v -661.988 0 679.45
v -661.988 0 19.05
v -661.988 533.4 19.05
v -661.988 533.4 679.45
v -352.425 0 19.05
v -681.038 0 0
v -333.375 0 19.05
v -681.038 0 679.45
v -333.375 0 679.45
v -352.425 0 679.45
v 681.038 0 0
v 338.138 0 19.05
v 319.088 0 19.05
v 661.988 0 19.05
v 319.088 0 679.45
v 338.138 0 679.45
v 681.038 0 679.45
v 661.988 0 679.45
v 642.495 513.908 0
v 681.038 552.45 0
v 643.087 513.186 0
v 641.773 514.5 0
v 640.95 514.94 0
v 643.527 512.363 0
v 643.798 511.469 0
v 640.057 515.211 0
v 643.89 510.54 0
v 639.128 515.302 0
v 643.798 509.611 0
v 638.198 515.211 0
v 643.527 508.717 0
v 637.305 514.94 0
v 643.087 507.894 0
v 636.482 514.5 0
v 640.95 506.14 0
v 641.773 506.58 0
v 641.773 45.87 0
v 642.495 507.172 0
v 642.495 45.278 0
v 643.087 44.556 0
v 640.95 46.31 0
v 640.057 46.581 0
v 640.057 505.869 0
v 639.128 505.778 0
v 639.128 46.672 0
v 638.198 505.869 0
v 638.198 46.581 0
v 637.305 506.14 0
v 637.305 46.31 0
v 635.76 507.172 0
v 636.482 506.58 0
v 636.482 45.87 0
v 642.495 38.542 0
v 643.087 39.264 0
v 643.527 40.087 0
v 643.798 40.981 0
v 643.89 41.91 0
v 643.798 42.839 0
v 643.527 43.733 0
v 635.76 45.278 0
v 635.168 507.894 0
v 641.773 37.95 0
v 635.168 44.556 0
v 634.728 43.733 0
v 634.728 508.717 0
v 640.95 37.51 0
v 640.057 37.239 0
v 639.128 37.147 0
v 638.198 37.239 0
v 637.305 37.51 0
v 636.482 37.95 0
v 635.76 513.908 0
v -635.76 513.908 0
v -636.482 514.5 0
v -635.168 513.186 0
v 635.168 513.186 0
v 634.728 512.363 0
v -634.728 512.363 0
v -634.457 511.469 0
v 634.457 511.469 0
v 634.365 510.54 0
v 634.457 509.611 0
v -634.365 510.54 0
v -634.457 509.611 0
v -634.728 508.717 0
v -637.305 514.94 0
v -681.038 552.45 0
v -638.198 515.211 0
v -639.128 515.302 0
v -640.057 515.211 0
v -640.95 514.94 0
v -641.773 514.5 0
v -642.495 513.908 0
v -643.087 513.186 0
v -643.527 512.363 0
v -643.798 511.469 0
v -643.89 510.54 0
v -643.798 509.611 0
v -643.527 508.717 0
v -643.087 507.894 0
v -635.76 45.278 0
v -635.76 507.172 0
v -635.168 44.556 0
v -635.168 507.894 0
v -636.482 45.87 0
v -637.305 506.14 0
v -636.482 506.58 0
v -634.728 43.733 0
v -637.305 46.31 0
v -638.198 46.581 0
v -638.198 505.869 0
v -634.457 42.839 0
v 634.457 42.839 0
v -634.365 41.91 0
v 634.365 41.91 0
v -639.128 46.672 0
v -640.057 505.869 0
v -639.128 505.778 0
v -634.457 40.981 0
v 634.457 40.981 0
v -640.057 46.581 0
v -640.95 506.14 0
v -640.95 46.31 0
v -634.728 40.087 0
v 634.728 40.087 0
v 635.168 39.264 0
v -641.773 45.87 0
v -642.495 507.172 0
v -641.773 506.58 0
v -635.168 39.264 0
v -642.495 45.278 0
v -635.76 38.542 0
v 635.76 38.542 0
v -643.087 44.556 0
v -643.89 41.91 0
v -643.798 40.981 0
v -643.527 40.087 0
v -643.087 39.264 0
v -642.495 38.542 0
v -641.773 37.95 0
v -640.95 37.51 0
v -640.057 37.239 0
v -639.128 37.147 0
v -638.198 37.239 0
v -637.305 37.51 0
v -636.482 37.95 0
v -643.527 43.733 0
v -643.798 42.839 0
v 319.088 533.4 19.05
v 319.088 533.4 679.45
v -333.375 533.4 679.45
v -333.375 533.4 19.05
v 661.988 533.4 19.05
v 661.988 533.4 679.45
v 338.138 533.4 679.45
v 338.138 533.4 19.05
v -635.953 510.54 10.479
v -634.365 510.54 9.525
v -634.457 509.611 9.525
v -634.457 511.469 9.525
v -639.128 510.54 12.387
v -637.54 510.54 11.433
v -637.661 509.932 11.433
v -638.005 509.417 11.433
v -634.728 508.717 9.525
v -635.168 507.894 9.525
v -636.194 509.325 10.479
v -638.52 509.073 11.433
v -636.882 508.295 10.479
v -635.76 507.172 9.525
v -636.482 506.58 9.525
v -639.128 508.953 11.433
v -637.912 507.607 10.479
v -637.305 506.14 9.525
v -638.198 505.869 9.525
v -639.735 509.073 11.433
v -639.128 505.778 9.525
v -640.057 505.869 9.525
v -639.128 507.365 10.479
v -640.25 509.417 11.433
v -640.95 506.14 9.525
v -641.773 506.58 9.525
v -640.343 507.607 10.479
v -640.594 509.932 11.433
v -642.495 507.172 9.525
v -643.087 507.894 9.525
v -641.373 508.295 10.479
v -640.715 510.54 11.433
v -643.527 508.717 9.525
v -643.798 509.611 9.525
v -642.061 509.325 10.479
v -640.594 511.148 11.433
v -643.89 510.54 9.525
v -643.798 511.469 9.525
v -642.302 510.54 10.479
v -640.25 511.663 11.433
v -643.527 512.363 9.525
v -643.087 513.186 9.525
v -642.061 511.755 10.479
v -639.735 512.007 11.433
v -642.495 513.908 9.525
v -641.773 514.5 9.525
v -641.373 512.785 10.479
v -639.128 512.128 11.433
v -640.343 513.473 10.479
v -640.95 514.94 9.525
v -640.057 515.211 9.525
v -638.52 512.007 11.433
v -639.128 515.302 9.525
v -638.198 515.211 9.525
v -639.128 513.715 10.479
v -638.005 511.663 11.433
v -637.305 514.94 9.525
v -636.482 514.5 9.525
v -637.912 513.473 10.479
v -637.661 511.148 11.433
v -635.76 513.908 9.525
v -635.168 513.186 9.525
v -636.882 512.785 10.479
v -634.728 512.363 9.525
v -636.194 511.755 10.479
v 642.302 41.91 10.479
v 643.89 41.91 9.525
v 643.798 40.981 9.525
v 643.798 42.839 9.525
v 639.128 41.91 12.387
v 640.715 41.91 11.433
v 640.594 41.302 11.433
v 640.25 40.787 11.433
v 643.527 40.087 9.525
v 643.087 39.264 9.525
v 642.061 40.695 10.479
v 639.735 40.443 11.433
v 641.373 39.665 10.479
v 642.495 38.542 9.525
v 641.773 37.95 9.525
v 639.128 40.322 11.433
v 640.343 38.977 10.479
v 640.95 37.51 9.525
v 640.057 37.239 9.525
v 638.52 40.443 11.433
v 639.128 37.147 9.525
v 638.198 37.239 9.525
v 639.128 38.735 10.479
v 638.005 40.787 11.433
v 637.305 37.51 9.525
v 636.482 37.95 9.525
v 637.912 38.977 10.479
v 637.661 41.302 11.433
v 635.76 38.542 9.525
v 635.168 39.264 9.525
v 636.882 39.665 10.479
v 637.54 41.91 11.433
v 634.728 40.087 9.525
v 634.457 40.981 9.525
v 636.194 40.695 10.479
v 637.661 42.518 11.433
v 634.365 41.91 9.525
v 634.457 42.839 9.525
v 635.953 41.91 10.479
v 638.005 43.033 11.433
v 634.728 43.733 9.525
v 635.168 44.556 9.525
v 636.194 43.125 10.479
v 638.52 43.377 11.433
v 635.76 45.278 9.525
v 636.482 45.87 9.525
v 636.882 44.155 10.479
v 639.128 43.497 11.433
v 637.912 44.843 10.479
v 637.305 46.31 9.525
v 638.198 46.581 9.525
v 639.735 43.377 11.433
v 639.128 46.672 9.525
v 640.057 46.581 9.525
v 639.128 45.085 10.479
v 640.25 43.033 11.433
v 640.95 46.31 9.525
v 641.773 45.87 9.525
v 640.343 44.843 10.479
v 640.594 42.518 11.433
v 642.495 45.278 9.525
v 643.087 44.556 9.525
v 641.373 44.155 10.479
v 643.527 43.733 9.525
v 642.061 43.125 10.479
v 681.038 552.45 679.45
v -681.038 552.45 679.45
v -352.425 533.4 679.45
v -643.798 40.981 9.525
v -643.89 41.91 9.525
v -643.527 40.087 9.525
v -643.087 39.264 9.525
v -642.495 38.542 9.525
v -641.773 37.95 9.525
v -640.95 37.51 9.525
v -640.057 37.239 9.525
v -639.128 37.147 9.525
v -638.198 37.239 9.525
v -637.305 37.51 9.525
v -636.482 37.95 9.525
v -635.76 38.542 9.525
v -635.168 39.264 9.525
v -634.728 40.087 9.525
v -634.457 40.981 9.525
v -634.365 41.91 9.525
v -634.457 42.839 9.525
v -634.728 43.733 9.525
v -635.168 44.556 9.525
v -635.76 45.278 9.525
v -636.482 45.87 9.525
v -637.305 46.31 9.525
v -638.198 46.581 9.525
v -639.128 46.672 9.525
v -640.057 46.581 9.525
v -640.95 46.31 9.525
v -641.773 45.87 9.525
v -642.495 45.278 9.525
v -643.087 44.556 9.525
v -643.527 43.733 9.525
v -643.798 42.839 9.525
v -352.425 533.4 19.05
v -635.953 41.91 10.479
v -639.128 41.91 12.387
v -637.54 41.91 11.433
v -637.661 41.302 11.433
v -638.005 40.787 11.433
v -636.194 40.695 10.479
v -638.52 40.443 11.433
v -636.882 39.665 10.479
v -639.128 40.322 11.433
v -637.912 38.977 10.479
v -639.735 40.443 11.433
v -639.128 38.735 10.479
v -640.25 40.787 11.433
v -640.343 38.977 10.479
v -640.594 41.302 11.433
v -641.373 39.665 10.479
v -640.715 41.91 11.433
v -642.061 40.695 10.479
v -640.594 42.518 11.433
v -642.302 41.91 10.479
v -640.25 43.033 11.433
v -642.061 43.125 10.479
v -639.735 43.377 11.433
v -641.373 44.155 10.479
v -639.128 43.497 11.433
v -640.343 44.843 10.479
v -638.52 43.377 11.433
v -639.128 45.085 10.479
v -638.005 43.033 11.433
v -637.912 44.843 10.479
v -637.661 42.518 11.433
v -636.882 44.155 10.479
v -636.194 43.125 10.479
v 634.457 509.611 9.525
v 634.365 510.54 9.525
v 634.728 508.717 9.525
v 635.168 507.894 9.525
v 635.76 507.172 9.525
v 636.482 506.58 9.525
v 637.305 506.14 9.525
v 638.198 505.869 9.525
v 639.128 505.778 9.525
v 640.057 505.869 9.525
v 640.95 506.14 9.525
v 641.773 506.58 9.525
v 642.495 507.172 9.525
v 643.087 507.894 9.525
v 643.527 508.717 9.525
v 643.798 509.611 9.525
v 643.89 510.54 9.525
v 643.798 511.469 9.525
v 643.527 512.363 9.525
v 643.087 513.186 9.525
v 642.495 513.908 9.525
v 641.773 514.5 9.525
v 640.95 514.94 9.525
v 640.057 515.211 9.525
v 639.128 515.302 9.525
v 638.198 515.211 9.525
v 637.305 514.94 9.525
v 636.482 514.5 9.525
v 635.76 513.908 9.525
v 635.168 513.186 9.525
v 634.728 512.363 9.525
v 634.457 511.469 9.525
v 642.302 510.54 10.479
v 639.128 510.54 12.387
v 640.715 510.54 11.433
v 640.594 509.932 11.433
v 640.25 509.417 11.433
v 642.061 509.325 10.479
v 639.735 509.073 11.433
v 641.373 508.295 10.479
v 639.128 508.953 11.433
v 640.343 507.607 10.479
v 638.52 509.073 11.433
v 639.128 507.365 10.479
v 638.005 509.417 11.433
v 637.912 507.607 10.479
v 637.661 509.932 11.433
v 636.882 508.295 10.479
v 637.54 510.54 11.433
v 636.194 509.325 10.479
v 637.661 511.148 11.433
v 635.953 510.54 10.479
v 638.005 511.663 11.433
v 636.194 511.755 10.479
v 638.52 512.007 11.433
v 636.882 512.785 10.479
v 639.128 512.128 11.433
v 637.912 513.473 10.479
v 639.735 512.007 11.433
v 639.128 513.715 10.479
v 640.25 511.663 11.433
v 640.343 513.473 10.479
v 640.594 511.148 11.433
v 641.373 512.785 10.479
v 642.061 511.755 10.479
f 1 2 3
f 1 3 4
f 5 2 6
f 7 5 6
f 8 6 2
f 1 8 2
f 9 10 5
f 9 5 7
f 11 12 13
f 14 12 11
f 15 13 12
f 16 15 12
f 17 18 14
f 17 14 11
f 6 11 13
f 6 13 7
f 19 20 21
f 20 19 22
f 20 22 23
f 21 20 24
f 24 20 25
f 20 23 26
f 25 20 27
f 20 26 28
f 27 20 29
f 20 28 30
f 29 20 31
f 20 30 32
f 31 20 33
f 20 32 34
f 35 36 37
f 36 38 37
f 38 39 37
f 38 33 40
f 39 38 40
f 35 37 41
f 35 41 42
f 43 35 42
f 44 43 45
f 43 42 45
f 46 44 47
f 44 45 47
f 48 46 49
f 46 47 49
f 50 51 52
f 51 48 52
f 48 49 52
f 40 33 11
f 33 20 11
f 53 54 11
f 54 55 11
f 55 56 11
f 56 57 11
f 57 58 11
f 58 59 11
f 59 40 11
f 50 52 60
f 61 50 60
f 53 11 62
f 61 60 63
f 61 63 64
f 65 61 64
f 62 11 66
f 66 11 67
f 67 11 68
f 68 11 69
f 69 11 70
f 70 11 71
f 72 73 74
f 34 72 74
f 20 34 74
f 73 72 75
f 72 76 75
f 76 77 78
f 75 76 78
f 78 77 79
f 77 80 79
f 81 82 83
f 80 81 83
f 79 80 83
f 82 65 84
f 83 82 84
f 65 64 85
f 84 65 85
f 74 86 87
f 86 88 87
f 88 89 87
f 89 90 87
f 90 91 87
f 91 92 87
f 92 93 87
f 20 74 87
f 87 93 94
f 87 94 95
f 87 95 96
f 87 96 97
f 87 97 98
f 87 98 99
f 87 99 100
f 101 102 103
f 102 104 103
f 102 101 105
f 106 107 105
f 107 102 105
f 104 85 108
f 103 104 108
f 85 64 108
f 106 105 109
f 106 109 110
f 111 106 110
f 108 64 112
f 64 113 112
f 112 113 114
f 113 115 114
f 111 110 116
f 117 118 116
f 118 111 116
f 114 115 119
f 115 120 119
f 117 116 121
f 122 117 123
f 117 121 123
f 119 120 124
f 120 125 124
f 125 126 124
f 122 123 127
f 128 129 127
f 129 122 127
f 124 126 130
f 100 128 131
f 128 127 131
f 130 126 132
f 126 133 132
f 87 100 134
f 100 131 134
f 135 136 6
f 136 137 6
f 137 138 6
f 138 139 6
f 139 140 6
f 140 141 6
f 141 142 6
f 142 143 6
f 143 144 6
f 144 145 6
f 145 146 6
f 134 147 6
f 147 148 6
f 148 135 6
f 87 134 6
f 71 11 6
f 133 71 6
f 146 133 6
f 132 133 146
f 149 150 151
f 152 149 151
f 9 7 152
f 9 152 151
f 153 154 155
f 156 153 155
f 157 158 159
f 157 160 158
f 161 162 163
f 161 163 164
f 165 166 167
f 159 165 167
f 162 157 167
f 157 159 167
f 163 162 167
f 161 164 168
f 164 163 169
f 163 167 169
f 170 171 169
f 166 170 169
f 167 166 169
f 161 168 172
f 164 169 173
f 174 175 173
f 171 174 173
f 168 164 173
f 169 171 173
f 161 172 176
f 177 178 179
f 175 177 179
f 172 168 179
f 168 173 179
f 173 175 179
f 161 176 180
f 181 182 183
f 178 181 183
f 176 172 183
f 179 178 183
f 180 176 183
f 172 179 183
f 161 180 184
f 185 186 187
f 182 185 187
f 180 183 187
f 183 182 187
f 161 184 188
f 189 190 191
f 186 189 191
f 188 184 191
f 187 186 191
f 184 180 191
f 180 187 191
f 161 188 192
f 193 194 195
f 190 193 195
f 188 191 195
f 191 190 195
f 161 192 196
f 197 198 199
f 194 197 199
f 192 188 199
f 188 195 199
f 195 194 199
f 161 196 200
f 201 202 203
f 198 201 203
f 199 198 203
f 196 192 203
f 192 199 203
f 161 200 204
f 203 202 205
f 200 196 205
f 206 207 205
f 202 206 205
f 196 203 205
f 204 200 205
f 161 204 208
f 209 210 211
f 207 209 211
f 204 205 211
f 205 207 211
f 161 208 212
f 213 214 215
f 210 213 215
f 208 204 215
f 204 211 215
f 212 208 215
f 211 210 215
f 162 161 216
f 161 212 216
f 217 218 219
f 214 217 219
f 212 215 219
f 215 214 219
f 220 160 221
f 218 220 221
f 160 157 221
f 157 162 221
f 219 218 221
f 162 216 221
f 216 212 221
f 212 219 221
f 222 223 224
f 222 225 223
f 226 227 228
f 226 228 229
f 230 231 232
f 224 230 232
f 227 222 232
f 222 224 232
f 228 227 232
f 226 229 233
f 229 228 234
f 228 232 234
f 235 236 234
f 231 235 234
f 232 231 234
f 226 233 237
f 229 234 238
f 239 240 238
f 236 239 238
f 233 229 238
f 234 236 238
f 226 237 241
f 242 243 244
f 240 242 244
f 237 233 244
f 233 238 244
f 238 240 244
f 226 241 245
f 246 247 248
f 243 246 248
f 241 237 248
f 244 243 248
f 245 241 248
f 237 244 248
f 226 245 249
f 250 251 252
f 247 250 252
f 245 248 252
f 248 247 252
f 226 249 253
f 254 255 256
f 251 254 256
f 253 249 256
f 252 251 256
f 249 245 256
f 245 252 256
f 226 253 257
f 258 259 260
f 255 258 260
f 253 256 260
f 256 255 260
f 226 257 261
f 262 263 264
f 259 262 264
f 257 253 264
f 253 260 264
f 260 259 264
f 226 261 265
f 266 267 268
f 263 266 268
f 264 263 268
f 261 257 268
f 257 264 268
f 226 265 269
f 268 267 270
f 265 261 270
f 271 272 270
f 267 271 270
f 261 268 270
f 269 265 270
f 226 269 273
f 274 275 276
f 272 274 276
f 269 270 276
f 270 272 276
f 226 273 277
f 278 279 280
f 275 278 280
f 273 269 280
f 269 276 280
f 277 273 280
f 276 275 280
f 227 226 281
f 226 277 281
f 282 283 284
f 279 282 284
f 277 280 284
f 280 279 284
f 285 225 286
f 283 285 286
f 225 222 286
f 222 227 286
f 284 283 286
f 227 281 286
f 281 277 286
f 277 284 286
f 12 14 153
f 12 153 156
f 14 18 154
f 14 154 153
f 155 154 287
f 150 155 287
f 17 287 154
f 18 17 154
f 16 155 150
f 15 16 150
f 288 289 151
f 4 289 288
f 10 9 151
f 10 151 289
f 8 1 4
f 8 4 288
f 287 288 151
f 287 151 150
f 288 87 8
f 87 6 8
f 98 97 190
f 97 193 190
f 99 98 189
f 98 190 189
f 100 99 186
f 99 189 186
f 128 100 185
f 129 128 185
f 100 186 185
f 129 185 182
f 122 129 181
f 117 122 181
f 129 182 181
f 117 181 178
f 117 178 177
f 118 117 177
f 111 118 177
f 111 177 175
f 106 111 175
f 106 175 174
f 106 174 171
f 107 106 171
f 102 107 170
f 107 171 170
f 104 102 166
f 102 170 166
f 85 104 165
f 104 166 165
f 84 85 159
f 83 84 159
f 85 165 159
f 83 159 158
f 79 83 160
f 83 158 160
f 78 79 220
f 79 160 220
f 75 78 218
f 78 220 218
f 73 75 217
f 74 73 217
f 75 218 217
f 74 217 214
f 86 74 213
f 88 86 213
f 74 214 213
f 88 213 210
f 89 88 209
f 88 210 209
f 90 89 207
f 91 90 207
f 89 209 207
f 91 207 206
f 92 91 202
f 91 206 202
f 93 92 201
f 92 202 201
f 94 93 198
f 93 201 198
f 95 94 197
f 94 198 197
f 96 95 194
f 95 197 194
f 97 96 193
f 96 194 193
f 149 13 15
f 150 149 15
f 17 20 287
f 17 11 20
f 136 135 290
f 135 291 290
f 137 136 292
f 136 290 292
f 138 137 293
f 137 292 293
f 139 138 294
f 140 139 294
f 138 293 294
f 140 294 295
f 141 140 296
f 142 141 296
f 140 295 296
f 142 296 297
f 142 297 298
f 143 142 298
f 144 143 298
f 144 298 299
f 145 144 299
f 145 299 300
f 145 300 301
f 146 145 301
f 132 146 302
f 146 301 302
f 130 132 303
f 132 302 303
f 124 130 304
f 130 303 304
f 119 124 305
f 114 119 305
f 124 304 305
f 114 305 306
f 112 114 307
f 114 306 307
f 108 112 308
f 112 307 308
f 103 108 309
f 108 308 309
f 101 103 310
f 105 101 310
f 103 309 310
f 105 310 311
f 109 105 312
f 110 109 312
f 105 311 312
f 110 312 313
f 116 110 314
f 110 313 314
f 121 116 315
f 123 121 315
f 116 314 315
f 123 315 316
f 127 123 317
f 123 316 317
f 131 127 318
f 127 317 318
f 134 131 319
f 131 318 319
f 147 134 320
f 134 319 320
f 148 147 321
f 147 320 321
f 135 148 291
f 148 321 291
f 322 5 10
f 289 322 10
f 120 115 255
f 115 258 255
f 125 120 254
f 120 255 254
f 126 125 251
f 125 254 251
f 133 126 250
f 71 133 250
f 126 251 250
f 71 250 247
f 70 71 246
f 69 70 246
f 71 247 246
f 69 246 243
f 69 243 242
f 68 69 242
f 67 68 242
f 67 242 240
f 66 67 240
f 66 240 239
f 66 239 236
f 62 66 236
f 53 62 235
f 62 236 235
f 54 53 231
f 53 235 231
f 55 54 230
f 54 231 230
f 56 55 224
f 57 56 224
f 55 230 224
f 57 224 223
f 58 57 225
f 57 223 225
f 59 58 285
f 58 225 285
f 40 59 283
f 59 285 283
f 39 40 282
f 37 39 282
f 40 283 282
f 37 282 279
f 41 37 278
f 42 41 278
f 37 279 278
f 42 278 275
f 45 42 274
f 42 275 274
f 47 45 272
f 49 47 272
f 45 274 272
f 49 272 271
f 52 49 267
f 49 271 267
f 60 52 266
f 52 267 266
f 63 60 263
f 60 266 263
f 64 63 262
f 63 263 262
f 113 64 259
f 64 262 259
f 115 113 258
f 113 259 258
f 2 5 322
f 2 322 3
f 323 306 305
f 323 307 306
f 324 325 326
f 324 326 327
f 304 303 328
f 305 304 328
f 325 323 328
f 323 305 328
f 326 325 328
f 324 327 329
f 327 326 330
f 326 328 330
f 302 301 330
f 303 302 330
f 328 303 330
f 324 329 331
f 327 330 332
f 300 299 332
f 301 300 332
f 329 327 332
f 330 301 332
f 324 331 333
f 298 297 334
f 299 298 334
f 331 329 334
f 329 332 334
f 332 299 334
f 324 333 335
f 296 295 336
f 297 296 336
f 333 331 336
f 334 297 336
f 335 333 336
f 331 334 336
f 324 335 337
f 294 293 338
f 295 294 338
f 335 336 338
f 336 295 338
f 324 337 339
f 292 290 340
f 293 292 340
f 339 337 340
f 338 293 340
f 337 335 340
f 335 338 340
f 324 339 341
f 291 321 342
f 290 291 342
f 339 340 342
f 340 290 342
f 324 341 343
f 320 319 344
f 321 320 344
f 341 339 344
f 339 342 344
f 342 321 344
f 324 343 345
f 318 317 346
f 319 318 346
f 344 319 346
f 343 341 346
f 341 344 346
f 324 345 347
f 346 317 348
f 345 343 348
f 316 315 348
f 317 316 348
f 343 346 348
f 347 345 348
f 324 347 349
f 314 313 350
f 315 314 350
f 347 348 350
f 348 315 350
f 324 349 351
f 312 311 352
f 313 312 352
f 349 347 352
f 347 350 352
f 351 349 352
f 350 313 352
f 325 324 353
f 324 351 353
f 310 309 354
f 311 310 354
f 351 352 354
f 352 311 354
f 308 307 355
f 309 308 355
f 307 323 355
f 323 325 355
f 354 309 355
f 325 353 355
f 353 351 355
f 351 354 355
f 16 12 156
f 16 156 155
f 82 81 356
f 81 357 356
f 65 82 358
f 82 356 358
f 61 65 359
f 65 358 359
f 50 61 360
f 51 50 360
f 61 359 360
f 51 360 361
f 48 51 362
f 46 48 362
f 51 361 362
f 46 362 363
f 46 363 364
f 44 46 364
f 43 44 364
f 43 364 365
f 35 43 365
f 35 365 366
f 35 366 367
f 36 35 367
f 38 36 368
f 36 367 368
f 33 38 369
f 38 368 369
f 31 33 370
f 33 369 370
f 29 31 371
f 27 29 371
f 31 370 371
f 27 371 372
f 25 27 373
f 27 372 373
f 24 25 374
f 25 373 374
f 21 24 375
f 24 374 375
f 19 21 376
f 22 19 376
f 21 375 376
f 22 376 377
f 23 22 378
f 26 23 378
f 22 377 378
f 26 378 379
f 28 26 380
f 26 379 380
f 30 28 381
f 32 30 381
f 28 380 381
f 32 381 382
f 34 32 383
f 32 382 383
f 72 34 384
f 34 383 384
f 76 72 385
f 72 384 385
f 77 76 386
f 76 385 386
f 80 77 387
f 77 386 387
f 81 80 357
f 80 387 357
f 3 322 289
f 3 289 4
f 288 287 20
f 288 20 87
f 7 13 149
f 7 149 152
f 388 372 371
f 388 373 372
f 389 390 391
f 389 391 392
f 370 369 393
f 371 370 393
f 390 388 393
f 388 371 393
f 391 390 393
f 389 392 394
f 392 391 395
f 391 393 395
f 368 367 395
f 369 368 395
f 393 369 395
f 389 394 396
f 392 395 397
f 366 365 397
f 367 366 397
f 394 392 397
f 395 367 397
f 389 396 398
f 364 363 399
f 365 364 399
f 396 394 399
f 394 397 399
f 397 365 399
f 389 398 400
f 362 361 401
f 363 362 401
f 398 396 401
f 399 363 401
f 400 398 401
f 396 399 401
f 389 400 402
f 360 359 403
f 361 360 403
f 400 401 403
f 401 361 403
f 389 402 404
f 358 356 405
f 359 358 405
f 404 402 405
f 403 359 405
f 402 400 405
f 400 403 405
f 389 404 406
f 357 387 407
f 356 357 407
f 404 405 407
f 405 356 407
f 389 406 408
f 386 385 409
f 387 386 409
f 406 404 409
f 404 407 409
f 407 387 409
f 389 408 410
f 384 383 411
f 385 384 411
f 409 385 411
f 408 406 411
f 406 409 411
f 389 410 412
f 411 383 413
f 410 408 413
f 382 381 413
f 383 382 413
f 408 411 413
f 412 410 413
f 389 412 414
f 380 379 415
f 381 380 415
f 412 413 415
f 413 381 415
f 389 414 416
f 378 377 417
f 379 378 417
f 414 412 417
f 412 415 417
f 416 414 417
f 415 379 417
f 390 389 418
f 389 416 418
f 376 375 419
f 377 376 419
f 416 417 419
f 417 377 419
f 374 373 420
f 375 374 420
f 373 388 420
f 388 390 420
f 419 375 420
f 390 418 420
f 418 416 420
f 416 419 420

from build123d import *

# Parameters (mm, degrees)
F1_DEPTH = 533.4
F2_W     = 1362.075
F2_H     = 679.45
F3_DEPTH = 19.05
F4_W     = 19.05
F4_H     = 660.4
F5_DEPTH = 533.4
F7_D     = 9.525
F7_DEPTH = 9.525
F7_TIP   = 2.8615986981


with BuildPart() as f1:
    # F0 (on Front) → F1 (new body)
    with BuildSketch(Plane.XZ):
        Polygon((-661.9875, 679.45), (-681.0375, 679.45), (-681.0375, 0), (681.0375, 0), (681.0375, 679.45), (661.9875, 679.45), (661.9875, 19.05), (-661.9875, 19.05), align=None)
    extrude(amount=-F1_DEPTH)

    # F2 (on face) → F3 (join)
    with BuildSketch(Plane(origin=(0, 533.4, 0), x_dir=(-1, 0, 0), z_dir=(0, 1, 0))):
        with Locations((0, 339.725)):
            Rectangle(F2_W, F2_H)
    extrude(amount=F3_DEPTH)

    # F4 (on face) → F5 (join, through all)
    with BuildSketch(Plane.XZ):
        with Locations((-342.9, 349.25)):
            Rectangle(F4_W, F4_H)
        with Locations((328.6125, 349.25)):
            Rectangle(F4_W, F4_H)
    extrude(amount=-F5_DEPTH)

    # F7
    with Locations(Plane(origin=(0, 0, 0), x_dir=(1, 0, 0), z_dir=(0, 0, -1))):
        with Locations((-639.1275, -41.91), (-639.1275, -510.54), (639.1275, -41.91), (639.1275, -510.54)):
            Hole(F7_D / 2, depth=F7_DEPTH)
            with Locations((0, 0, -(F7_DEPTH + F7_TIP / 2))):  # 118° drill point
                Cone(0, F7_D / 2, F7_TIP, mode=Mode.SUBTRACT)


solid = f1.part
